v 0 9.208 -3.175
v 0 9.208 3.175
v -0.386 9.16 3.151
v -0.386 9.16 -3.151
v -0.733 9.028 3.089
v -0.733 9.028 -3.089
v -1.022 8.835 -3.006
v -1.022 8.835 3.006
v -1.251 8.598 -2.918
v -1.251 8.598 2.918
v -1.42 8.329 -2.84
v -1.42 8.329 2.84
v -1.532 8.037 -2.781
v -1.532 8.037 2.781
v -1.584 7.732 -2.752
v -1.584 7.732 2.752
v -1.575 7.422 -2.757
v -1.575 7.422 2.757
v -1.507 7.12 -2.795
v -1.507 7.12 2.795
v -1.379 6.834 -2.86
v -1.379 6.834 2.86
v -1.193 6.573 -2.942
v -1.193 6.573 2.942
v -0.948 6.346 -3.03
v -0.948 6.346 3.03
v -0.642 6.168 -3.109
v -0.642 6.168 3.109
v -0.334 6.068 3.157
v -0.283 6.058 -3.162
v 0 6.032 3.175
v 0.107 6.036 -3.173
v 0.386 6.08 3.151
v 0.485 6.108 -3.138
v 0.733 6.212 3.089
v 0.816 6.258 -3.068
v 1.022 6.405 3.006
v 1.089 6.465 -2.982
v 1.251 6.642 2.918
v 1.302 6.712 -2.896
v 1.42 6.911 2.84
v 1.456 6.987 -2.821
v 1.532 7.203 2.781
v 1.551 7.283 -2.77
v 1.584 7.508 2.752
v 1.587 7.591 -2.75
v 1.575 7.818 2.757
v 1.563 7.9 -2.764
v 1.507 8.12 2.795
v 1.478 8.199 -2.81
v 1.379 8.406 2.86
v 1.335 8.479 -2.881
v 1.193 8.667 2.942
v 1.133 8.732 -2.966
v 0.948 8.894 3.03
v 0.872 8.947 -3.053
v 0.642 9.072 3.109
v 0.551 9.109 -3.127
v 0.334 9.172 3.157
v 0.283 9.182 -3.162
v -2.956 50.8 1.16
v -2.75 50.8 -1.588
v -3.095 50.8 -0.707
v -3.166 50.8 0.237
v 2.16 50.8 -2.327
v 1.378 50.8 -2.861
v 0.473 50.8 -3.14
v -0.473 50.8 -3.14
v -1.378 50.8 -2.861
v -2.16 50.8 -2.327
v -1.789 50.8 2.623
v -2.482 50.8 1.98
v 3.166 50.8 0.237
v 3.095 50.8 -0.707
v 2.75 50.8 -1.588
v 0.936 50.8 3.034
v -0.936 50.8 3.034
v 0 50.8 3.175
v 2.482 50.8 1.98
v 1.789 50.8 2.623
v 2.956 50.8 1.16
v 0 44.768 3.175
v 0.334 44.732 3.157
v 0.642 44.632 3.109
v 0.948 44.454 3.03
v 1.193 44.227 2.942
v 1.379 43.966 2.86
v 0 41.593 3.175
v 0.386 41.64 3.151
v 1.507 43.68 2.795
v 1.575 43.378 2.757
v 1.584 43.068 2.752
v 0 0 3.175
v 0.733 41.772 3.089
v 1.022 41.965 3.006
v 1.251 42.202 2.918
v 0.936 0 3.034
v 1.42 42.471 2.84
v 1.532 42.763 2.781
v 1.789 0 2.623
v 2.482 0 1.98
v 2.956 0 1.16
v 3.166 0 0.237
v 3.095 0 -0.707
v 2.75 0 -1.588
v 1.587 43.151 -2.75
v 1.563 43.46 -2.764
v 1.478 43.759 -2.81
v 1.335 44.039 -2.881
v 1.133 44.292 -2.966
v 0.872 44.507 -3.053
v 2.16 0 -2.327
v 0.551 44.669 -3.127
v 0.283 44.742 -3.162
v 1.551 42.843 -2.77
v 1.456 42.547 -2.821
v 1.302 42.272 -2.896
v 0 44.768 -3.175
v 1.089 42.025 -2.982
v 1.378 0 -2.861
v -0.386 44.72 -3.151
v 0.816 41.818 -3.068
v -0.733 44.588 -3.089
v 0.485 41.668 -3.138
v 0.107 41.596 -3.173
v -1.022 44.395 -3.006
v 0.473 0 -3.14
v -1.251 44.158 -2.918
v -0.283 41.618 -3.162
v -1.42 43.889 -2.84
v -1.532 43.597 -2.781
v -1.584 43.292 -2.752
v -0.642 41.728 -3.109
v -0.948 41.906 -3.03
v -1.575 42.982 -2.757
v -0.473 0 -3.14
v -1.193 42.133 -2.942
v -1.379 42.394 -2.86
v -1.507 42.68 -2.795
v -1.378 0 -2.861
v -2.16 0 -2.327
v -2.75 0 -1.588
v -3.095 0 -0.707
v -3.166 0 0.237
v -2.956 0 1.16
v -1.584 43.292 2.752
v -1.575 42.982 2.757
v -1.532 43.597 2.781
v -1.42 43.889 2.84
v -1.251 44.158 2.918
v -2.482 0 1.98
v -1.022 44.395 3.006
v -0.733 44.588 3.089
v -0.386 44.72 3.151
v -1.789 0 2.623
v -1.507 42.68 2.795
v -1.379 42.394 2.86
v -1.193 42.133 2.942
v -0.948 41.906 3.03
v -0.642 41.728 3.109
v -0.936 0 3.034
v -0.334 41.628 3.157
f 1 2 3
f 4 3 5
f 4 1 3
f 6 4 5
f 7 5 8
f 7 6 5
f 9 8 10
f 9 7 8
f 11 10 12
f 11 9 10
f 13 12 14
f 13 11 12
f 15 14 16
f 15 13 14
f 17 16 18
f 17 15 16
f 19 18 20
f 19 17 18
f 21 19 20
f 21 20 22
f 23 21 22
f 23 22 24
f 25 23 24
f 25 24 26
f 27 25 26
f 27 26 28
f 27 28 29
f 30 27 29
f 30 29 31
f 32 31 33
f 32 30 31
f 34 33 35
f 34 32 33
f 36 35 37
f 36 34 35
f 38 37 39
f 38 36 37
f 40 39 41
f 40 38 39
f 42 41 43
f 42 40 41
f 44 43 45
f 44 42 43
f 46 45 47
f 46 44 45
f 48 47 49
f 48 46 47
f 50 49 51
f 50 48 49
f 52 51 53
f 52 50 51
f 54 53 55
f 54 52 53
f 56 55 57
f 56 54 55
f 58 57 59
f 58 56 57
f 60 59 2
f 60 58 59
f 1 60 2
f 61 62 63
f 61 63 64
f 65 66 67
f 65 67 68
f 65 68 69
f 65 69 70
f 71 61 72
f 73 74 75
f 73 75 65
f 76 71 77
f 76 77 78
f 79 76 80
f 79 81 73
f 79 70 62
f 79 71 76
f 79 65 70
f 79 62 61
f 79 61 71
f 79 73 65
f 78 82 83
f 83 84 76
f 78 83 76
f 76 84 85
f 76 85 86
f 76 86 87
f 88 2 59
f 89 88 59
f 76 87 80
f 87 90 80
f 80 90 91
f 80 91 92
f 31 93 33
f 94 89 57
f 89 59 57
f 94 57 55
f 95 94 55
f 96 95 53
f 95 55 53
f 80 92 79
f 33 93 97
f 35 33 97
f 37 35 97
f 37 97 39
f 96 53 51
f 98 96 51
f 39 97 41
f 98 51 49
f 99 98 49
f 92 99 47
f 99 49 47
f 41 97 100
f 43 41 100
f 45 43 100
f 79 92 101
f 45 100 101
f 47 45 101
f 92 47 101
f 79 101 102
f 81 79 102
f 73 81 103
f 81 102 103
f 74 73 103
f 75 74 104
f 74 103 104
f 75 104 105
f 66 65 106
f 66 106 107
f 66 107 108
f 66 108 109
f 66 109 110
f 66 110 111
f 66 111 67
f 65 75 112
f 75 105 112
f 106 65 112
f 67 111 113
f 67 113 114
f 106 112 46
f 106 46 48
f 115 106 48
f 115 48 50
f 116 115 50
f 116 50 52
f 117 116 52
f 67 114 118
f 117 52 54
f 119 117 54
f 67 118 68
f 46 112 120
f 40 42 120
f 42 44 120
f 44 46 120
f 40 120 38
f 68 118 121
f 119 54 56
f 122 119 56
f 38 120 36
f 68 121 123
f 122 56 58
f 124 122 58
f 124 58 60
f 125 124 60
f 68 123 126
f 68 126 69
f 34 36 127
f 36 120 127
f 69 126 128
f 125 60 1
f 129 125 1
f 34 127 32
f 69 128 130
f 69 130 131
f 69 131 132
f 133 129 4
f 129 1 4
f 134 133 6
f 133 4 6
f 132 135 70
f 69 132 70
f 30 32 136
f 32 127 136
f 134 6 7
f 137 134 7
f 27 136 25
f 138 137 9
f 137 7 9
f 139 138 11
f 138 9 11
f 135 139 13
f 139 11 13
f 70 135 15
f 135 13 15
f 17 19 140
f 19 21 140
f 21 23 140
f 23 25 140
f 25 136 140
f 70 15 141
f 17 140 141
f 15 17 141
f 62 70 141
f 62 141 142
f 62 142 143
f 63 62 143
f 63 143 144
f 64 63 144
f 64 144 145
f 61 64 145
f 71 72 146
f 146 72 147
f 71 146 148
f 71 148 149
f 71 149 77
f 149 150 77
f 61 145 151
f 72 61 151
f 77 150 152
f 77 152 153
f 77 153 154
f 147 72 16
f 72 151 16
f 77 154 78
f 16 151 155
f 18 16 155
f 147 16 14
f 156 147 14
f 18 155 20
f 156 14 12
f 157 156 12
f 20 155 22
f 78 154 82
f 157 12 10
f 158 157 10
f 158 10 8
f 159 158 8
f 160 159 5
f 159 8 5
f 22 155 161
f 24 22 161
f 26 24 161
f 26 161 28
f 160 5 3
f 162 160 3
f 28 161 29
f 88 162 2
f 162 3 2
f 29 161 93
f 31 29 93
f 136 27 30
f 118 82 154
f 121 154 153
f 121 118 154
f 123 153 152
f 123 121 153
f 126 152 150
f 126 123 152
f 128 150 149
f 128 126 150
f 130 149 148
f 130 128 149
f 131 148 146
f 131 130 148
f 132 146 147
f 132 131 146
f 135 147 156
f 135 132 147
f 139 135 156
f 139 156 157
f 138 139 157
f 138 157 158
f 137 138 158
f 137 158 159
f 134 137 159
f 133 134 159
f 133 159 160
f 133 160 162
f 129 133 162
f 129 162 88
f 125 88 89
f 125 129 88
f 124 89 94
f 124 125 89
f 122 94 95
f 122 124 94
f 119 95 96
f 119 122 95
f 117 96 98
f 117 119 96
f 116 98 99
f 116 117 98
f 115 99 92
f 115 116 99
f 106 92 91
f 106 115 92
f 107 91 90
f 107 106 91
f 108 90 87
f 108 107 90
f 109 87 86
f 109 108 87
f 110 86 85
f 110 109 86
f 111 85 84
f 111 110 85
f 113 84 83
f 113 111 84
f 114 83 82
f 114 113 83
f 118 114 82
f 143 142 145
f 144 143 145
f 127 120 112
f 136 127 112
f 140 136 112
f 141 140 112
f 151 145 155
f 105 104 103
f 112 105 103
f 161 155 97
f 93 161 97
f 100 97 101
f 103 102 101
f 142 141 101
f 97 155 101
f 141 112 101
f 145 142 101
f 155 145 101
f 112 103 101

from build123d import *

# Parameters (mm, degrees)
SKETCH1_R               = 3.175
BOSS_EXTRUDE1_DEPTH     = 50.8
CUT_EXTRUDE1_DEPTH      = 12.192
CUT_EXTRUDE1_DEPTH_BACK = 11.176
SKETCH2_R               = 1.5875
CUT_EXTRUDE2_DEPTH      = 11.176
CUT_EXTRUDE2_DEPTH_BACK = 11.176
SKETCH3_R               = 1.5875


with BuildPart() as part:
    # Sketch1 → Boss-Extrude1 (new body)
    with BuildSketch(Plane(origin=(0, 0, 0), x_dir=(1, 0, 0), z_dir=(0, 1, 0))):
        with Locations(Location((0, 0, 0), (0, 0, 270))):
            Circle(SKETCH1_R)
    extrude(amount=BOSS_EXTRUDE1_DEPTH)

    # Sketch2 → Cut-Extrude1 (cut, two sides: drawn at the far end of the back side and taken through both)
    with BuildSketch(Plane.XY.offset(-CUT_EXTRUDE1_DEPTH_BACK)):
        with Locations(Location((0, 43.18, 0), (0, 0, 89.99999999))):
            Circle(SKETCH2_R)
    extrude(amount=CUT_EXTRUDE1_DEPTH + CUT_EXTRUDE1_DEPTH_BACK, mode=Mode.SUBTRACT)

    # Sketch3 → Cut-Extrude2 (cut, two sides: drawn at the far end of the back side and taken through both)
    with BuildSketch(Plane.XY.offset(-CUT_EXTRUDE2_DEPTH_BACK)):
        with Locations(Location((0, 7.62, 0), (0, 0, 89.99999999))):
            Circle(SKETCH3_R)
    extrude(amount=CUT_EXTRUDE2_DEPTH + CUT_EXTRUDE2_DEPTH_BACK, mode=Mode.SUBTRACT)


solid = part.part
